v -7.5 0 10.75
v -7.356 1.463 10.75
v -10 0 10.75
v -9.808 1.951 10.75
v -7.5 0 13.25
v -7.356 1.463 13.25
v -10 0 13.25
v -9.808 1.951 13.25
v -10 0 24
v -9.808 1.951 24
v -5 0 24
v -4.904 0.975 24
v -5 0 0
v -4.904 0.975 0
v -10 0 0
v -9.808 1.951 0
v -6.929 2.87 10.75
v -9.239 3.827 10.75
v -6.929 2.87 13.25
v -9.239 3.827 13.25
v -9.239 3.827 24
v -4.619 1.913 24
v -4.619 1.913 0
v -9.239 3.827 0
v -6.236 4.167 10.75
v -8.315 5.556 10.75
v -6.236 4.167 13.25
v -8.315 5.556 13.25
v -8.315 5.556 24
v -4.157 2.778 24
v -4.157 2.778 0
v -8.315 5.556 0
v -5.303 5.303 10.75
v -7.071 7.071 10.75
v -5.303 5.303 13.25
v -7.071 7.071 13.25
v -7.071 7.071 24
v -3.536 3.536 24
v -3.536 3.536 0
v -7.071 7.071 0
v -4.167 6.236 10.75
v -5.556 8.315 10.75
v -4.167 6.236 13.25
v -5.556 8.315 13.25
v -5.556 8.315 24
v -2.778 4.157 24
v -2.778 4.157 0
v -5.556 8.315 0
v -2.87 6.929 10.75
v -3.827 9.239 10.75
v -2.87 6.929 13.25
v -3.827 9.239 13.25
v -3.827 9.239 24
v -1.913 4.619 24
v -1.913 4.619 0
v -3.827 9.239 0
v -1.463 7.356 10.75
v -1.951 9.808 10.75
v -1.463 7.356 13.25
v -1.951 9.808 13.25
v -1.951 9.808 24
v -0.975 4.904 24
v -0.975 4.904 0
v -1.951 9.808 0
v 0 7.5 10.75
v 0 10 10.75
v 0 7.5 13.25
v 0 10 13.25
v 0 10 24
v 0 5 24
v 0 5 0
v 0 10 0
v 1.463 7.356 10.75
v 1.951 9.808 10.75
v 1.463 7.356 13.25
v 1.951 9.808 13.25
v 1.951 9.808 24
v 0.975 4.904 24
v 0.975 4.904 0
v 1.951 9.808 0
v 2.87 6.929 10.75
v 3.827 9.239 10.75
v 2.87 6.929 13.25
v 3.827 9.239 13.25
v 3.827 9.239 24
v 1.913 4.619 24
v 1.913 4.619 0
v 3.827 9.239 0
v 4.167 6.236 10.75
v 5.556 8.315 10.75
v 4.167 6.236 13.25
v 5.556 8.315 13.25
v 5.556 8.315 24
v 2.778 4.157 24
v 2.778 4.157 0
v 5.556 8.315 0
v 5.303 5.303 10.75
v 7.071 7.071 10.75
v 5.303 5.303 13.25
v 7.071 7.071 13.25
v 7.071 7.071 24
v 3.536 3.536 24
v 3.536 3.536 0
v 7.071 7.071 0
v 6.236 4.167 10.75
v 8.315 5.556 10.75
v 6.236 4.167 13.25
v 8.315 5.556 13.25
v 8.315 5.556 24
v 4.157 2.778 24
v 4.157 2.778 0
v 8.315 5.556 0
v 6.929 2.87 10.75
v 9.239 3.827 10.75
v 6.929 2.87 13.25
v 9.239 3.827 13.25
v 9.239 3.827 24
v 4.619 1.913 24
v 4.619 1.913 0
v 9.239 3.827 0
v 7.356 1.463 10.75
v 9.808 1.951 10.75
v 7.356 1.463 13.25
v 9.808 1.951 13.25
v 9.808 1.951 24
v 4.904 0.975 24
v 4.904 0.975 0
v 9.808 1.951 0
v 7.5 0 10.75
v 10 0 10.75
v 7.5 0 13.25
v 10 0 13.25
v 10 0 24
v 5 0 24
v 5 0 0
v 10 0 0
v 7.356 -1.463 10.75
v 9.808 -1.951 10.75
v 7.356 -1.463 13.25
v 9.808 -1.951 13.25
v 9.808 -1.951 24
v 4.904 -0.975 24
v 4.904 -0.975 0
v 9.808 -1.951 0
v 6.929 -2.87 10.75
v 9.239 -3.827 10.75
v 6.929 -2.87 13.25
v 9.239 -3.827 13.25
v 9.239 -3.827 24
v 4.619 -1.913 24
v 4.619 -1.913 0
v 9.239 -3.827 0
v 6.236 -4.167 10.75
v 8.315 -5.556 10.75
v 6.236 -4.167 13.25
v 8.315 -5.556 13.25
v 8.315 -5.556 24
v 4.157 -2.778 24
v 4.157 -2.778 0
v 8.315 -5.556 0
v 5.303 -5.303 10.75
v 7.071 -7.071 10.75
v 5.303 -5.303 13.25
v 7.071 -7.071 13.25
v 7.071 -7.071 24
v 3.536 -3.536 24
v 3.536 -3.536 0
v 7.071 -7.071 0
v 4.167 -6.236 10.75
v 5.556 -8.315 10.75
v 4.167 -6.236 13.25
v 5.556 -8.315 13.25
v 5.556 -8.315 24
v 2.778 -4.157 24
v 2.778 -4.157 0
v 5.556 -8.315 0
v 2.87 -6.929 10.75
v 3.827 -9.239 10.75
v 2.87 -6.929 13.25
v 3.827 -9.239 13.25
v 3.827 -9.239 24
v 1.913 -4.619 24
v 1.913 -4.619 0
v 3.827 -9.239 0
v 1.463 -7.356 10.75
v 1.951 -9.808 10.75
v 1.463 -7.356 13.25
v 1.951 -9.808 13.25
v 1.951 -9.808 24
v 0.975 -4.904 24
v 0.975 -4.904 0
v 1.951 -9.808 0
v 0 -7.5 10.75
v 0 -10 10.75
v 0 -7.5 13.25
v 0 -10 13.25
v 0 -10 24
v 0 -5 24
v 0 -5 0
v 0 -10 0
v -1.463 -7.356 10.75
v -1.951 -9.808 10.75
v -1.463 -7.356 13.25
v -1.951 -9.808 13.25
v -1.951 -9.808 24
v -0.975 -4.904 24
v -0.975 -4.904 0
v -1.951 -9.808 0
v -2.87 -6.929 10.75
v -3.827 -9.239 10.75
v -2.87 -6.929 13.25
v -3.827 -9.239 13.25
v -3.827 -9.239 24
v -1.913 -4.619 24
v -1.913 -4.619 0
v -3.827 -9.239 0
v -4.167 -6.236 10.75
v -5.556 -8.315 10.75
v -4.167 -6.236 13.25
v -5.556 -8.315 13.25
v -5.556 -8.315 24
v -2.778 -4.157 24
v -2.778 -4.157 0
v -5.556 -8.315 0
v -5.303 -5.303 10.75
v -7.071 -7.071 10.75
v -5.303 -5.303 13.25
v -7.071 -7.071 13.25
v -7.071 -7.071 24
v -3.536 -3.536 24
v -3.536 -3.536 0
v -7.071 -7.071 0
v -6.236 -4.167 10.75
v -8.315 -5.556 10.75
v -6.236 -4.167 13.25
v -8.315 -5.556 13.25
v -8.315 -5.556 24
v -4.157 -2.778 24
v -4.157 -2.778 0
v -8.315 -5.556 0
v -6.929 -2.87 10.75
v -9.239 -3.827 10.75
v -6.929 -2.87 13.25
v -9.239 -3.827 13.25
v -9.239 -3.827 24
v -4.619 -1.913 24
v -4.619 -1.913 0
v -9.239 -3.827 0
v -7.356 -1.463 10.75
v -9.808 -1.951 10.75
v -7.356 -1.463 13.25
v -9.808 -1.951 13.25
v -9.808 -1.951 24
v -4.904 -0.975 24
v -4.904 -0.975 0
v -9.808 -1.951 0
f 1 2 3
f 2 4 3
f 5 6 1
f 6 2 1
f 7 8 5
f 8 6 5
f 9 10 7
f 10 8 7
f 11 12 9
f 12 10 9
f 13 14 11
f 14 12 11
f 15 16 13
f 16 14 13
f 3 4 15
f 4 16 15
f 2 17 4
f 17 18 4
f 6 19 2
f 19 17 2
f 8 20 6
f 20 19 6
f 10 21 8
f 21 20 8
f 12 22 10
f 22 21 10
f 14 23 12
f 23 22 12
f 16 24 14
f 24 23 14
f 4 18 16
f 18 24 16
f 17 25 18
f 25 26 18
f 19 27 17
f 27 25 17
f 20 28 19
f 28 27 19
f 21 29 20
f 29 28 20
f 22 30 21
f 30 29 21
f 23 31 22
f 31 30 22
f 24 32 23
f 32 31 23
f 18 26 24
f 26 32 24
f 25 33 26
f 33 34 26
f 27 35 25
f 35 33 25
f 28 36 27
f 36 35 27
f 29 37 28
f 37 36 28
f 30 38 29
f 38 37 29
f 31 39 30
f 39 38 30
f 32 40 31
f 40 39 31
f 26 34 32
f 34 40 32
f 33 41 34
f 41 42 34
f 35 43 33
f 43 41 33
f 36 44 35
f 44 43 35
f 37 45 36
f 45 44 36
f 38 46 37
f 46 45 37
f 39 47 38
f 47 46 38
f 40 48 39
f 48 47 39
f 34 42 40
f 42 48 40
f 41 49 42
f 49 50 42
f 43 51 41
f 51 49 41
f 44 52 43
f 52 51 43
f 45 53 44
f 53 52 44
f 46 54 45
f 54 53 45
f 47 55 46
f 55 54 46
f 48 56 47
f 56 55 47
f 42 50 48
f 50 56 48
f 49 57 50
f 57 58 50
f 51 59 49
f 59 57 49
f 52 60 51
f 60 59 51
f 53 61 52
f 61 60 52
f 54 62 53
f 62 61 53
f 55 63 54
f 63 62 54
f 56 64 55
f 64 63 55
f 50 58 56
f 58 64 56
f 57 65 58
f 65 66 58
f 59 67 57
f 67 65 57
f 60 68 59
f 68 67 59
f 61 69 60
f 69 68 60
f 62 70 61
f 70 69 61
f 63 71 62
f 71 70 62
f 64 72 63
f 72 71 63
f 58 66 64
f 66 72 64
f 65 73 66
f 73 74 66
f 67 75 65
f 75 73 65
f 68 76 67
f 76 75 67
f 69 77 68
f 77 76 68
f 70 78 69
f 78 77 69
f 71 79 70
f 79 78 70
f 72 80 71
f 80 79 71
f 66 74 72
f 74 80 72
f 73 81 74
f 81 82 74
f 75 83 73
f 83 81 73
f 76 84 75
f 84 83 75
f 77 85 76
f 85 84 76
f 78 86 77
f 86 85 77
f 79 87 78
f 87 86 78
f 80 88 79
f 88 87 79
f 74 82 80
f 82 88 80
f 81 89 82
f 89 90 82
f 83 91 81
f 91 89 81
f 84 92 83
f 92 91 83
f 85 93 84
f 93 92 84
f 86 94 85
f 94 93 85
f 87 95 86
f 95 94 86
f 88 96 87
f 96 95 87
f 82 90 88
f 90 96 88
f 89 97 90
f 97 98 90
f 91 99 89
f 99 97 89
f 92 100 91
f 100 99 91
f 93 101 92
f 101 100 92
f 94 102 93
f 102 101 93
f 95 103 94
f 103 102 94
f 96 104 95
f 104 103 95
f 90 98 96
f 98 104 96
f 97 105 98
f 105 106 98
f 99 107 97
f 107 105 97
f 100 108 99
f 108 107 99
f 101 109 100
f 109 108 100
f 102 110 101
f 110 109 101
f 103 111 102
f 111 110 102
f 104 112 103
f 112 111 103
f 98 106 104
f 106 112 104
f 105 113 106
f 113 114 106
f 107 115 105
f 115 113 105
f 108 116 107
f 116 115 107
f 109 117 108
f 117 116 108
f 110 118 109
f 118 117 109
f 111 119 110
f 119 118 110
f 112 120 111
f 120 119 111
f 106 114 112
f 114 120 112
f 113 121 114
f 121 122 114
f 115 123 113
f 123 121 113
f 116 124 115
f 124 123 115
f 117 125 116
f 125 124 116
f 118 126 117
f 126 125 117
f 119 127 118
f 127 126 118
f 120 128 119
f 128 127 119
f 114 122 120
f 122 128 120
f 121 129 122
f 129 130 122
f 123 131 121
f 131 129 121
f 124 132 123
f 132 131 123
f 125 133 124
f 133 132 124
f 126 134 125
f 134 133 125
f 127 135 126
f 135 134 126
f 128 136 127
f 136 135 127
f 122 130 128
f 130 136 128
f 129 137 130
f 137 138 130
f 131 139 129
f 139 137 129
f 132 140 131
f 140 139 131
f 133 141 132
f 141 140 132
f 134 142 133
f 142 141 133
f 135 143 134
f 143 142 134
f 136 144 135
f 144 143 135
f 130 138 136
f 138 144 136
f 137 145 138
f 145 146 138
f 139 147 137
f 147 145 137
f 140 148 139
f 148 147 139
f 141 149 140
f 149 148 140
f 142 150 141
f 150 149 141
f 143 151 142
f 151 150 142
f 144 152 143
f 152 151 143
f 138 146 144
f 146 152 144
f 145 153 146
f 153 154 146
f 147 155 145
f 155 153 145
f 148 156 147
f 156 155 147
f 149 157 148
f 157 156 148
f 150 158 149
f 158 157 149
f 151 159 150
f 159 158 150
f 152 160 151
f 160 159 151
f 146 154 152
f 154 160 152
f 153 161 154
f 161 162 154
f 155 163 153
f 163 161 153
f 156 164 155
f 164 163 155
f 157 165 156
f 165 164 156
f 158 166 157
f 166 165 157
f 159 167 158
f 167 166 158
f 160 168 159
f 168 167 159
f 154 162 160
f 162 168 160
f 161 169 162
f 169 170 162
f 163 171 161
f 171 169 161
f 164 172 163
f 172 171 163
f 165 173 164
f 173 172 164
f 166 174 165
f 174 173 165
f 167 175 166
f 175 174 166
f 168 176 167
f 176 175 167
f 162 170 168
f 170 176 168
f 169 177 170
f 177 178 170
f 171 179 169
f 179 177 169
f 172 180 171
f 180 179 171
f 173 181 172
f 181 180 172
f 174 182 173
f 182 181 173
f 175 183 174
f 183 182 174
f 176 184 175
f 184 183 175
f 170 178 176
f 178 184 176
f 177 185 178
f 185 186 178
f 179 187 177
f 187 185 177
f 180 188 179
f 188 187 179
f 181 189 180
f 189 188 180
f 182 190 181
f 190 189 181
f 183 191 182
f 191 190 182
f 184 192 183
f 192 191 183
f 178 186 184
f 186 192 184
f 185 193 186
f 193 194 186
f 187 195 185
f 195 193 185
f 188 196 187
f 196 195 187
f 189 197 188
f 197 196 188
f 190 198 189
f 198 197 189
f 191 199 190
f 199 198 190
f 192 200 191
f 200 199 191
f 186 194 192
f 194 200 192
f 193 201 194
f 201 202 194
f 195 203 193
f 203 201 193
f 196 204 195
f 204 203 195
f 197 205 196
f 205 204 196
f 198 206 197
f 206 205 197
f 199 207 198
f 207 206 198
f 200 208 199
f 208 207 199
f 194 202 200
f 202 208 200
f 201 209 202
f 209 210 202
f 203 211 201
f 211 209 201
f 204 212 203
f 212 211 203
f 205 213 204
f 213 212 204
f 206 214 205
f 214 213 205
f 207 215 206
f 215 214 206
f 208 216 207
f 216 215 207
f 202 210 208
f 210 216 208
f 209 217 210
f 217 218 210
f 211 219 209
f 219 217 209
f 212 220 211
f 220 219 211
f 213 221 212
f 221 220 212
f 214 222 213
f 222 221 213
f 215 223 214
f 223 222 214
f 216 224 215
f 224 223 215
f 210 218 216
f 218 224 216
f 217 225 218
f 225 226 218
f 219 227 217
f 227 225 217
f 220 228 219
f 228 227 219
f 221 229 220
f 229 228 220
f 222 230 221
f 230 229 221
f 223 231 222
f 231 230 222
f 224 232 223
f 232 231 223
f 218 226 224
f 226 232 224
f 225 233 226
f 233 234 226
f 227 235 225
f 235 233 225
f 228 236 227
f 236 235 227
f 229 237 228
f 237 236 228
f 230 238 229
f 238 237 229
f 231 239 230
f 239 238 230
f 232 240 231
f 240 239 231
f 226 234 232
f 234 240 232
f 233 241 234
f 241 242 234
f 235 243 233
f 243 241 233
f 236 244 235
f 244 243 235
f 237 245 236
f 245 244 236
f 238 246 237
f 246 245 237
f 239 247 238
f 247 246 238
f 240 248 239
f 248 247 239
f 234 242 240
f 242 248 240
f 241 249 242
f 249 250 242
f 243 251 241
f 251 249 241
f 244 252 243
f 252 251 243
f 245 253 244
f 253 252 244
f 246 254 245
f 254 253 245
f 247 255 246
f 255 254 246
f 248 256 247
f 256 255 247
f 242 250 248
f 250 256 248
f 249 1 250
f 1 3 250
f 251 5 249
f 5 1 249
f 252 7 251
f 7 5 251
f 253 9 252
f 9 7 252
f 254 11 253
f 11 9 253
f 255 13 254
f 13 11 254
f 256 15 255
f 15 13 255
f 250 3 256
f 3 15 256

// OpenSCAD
$fn = 32;

// ----------------------------------------------------------------------
// Grooved revolve: stepped, bore R5
// ----------------------------------------------------------------------

// --- parameters (mm) ---
bore_r = 5;               // bore radius
outer_r = 10;             // outer radius of the body
total_h = 24;             // overall height, Z
wall = 5;                 // radial wall thickness
groove_w = 2.5;           // groove width
groove_d = 2.5;           // groove depth
grooves = 1;              // number of outer grooves

bbox_x = 2 * outer_r;  // full diameter
bore_d = 2 * bore_r;  // bore diameter
body_d = 2 * outer_r;  // body diameter
revolve_angle = 360;  // full turn around the Z axis

profile = [[5, 0], [10, 0], [10, 10.75], [7.5, 10.75], [7.5, 13.25], [10, 13.25], [10, 24], [5, 24]];  // primary outline, 8 points, counter clockwise

// --- the one profile operation ---
rotate_extrude(angle = revolve_angle) polygon(points = profile);
